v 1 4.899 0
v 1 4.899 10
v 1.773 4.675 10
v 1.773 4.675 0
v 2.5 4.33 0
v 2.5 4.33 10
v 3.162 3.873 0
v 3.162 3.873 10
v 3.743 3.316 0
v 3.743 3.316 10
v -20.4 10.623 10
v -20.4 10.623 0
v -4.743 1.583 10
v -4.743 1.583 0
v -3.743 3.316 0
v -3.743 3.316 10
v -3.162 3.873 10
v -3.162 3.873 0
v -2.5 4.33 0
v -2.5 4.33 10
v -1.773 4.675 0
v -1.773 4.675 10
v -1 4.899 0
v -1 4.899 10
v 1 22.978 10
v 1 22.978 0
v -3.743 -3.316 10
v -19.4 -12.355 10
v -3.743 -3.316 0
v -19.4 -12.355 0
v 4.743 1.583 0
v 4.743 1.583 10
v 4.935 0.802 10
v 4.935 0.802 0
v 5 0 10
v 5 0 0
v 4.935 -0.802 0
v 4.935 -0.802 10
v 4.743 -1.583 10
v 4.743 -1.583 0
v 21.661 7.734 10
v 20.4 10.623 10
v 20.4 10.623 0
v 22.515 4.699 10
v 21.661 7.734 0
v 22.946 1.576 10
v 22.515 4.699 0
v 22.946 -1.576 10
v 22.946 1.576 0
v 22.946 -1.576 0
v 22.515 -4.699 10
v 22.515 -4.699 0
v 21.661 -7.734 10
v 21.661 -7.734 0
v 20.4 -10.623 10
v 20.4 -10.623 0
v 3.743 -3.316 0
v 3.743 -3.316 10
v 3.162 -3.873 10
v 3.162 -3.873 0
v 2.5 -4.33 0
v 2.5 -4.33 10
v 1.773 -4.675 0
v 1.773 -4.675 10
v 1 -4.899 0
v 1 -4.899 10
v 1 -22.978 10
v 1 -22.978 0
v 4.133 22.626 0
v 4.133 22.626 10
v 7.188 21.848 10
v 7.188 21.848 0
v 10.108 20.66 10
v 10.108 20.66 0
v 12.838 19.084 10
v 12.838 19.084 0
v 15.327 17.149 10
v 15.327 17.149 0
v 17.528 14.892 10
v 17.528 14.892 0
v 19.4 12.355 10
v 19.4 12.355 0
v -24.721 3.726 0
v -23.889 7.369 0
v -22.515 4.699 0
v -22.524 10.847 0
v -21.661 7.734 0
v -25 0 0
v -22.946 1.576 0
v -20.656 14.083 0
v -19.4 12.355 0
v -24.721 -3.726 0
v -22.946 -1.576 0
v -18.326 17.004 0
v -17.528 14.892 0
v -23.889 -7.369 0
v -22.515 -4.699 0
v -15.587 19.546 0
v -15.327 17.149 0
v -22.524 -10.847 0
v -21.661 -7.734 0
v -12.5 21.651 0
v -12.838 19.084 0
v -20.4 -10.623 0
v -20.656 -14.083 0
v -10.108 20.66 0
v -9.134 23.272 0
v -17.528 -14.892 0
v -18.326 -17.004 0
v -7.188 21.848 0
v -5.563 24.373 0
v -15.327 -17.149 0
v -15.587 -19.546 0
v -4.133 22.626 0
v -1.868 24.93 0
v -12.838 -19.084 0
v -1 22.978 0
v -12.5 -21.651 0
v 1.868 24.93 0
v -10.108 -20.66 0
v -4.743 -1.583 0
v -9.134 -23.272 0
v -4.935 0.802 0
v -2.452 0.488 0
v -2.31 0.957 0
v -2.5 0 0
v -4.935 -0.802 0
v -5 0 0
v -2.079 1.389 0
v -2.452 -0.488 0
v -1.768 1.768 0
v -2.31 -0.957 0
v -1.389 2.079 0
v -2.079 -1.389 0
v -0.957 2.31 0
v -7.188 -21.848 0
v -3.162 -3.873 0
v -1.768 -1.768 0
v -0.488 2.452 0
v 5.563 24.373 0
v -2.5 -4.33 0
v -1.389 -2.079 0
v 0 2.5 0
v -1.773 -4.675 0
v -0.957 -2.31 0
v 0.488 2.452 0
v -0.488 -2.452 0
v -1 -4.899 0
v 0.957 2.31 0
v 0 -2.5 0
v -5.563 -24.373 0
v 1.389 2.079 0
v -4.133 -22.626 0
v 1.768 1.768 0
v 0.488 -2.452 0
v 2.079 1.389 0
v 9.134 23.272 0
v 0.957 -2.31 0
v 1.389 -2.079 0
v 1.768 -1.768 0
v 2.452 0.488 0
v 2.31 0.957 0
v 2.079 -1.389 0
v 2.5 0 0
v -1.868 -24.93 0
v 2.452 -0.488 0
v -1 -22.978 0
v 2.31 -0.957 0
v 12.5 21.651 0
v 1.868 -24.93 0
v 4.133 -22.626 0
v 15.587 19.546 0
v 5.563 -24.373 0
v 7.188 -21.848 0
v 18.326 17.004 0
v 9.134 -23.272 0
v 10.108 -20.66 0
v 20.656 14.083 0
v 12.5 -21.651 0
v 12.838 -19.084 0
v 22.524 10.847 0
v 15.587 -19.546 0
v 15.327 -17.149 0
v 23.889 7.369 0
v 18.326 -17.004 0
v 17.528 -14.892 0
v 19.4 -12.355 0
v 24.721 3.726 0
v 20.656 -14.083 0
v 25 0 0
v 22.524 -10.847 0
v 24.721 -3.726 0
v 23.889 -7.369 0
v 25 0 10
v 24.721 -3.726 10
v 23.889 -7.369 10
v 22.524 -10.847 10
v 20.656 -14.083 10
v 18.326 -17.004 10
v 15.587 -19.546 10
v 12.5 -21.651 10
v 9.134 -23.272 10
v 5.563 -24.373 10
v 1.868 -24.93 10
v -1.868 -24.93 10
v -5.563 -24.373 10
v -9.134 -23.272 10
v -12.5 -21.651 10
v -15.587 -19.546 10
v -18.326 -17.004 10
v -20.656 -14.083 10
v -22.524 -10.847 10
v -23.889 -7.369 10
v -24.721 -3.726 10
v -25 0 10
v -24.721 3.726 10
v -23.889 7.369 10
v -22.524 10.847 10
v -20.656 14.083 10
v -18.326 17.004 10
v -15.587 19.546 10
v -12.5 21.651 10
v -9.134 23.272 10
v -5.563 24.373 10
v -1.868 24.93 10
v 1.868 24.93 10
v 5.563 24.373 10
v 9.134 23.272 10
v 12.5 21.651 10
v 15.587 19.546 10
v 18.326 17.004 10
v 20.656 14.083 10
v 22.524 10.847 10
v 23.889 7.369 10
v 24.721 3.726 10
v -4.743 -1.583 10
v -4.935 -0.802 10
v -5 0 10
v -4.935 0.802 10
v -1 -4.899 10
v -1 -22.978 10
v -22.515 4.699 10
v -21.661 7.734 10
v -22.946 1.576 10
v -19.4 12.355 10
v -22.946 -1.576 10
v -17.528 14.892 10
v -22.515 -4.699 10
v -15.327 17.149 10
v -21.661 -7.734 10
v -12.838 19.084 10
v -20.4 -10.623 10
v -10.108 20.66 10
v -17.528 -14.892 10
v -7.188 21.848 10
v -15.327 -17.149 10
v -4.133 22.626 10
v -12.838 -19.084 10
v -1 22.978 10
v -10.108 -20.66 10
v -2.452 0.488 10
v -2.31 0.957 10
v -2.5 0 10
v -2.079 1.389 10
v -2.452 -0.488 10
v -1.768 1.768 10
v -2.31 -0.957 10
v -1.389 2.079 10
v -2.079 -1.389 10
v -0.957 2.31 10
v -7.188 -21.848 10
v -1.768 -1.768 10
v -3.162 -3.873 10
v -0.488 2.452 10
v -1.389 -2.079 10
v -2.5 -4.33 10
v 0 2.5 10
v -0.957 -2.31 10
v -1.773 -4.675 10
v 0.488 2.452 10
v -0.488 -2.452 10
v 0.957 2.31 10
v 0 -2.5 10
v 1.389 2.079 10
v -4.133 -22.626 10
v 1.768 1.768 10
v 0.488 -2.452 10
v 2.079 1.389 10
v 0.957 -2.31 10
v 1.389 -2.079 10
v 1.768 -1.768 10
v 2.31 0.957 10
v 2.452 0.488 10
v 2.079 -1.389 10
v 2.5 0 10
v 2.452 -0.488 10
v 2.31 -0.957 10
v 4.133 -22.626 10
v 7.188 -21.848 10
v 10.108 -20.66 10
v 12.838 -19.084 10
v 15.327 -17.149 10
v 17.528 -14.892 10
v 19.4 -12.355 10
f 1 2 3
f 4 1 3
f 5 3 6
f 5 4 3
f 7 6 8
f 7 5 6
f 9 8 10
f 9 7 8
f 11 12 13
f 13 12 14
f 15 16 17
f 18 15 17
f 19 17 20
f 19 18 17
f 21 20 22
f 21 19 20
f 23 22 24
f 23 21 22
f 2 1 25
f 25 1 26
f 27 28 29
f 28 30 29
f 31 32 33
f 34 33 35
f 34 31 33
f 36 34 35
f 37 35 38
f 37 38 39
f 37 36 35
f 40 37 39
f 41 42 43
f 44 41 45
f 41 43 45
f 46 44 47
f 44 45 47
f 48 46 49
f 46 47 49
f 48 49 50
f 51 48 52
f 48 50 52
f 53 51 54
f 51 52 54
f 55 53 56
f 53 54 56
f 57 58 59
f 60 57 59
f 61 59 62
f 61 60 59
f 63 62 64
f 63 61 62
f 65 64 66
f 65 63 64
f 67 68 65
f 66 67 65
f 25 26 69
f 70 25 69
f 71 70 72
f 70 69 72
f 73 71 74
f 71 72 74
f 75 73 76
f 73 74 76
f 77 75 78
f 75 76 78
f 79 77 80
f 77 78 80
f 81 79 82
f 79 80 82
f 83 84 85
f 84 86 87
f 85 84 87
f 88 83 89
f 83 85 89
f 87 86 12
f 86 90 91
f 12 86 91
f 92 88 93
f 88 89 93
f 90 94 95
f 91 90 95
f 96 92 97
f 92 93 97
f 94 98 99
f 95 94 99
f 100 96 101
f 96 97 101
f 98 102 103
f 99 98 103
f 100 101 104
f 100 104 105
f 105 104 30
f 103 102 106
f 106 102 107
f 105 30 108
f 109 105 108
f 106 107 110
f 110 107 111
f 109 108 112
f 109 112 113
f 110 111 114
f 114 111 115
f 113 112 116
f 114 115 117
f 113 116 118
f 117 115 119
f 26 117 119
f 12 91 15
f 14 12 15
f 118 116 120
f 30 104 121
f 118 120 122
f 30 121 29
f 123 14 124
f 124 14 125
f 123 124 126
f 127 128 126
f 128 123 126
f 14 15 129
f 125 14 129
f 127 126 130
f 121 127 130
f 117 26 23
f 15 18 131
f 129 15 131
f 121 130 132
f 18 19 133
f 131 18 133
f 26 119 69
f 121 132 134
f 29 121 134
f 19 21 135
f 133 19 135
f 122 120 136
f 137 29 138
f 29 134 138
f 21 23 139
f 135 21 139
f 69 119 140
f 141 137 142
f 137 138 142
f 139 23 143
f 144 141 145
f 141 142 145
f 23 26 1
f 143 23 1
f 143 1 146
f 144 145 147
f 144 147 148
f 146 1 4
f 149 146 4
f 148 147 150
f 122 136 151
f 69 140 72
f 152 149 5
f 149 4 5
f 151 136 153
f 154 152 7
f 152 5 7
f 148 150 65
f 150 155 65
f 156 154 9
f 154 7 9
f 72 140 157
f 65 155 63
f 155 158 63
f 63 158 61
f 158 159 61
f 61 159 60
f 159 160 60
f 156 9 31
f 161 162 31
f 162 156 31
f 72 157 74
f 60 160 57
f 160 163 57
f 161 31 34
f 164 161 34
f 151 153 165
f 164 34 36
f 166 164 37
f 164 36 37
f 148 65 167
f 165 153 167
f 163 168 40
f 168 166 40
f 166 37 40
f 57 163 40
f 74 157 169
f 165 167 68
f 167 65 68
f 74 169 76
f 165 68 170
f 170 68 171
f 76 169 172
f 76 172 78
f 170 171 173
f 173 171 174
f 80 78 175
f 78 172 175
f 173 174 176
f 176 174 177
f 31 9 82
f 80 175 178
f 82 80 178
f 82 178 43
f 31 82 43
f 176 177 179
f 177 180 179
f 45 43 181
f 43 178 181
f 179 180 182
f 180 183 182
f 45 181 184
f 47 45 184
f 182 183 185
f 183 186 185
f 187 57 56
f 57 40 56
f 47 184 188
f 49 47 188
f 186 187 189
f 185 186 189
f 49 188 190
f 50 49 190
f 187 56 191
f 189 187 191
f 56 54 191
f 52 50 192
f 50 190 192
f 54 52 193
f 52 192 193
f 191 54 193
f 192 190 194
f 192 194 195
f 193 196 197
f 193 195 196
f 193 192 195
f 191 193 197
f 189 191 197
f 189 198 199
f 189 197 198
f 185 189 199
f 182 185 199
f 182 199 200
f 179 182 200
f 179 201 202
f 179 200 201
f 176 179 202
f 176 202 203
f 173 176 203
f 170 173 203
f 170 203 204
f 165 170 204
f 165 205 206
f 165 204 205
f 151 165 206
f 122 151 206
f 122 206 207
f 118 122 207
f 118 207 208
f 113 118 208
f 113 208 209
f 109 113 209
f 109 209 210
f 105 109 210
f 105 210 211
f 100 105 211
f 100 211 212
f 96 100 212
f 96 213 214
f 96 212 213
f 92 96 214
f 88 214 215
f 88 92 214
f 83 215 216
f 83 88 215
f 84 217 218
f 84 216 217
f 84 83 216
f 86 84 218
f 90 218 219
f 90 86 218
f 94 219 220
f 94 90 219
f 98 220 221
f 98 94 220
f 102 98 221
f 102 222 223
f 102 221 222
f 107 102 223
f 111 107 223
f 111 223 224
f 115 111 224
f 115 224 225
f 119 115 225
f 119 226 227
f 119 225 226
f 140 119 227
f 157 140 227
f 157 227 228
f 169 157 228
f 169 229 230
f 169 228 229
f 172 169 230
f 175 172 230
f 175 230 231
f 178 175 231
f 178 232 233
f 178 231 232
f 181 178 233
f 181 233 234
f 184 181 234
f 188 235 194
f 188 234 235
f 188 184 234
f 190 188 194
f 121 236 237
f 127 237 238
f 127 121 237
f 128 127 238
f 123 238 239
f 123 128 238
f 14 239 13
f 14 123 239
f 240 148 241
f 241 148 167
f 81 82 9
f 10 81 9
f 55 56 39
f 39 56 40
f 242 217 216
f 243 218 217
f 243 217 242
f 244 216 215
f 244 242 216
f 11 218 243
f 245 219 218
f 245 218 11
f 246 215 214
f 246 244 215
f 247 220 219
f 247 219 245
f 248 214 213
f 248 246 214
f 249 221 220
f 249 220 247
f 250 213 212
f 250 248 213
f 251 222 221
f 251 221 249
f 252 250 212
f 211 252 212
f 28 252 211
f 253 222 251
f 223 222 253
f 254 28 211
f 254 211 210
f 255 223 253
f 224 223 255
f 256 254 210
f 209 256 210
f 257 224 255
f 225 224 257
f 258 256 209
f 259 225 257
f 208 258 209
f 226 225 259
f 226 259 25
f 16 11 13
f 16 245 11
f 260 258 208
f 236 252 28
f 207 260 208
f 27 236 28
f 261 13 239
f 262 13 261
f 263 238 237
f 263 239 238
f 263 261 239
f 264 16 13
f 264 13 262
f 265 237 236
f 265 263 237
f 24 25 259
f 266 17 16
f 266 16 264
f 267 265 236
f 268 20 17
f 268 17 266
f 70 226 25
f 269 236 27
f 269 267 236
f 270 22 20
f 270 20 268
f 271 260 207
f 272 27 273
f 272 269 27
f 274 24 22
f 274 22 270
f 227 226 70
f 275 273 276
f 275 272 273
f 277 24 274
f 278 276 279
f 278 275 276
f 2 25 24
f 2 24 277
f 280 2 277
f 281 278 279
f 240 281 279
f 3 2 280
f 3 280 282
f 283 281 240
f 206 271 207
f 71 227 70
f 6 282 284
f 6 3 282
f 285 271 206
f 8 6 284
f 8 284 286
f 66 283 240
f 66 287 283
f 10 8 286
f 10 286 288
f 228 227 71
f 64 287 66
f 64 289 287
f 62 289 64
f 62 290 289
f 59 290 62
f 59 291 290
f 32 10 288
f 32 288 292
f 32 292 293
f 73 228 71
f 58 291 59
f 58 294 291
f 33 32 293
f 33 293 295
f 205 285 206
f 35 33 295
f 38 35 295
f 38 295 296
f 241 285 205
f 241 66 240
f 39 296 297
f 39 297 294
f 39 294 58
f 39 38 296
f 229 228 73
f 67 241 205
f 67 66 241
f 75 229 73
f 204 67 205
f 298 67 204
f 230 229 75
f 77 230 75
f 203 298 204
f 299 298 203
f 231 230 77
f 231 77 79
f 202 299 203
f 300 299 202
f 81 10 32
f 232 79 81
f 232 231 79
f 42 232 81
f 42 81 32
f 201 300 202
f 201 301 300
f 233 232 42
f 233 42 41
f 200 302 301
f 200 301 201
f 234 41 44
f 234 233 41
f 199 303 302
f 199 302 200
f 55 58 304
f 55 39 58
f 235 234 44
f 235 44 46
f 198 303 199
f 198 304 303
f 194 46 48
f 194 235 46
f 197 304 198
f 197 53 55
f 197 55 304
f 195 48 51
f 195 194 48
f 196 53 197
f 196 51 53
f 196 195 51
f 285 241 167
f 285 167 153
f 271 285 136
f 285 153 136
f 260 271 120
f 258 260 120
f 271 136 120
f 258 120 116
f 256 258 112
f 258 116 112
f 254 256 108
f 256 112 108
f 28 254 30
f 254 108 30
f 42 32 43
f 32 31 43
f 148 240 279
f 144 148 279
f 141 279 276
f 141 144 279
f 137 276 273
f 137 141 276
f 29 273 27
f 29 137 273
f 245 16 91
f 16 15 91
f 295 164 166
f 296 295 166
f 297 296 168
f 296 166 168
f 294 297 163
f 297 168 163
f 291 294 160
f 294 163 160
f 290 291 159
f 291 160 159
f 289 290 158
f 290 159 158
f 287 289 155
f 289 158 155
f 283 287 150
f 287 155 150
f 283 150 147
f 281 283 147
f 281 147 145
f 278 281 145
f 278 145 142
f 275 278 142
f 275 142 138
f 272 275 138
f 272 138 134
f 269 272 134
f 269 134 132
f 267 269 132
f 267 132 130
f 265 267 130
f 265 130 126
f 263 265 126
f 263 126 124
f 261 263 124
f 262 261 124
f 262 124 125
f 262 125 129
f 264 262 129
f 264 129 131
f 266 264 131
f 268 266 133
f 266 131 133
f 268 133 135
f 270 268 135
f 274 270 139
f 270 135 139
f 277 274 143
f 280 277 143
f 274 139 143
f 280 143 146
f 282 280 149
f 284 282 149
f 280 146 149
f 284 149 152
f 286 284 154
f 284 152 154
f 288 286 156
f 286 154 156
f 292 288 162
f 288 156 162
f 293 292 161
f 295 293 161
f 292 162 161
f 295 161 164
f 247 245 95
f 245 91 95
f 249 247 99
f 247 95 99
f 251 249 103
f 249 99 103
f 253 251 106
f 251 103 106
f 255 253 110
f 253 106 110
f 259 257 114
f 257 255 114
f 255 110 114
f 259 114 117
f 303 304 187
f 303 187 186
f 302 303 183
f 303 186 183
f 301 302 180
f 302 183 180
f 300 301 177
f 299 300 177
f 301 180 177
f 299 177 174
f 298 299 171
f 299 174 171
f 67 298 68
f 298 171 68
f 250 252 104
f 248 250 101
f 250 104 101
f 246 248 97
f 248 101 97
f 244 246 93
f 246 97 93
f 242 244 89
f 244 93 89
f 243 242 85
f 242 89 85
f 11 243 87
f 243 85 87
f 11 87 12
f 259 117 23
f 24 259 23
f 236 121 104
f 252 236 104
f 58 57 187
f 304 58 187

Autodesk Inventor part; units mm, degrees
ref_plane "YZ Plane" through (0, 0, 0) normal (1, 0, 0) x (0, 1, 0)
ref_plane "XZ Plane" through (0, 0, 0) normal (0, 1, 0) x (-1, 0, 0)
ref_plane "XY Plane" through (0, 0, 0) normal (0, 0, 1) x (1, 0, 0)
sketch "スケッチ1" plane through (0, 0, 0) normal (0, 0, 1) x (1, 0, 0)
  circle A0 centre (0, 0) radius 25
  circle A1 centre (0, 0) radius 23
  circle A2 centre (0, 0) radius 5
  circle A3 centre (0, 0) radius 2.5
  dimension "d0" = 50
  dimension "d1" = 2
  dimension "d2" = 10
  dimension "d3" = 5
extrude "押し出し1" add sketch "スケッチ1" along normal blind 10
sketch "スケッチ2" plane through (0, 0, 0) normal (0, 0, 1) x (1, 0, 0)
  line L0 (-1, 2.5) -> (1, 2.5)
  line L1 (1, 2.5) -> (1, 23)
  line L2 (1, 23) -> (-1, 23)
  line L3 (-1, 23) -> (-1, 2.5)
  circle A0 centre (0, 0) radius 23 projected
  circle A1 centre (0, 0) radius 2.5 projected
  point P0 (0, 2.5)
  point P1 (-1, 22.9783)
  point P2 (1, 22.9783)
  dimension "d6" = 2
extrude "押し出し2" add sketch "スケッチ2" along normal blind 10 contours L3 A0 L1 L0 picked at (-0.6667, 9.3261)
pattern_circular "円形状パターン1" count 6 over 360 about axis through (0, 0, -10) along (0, 0, 1) of "押し出し2"
properties part number "Wheel-D50"
